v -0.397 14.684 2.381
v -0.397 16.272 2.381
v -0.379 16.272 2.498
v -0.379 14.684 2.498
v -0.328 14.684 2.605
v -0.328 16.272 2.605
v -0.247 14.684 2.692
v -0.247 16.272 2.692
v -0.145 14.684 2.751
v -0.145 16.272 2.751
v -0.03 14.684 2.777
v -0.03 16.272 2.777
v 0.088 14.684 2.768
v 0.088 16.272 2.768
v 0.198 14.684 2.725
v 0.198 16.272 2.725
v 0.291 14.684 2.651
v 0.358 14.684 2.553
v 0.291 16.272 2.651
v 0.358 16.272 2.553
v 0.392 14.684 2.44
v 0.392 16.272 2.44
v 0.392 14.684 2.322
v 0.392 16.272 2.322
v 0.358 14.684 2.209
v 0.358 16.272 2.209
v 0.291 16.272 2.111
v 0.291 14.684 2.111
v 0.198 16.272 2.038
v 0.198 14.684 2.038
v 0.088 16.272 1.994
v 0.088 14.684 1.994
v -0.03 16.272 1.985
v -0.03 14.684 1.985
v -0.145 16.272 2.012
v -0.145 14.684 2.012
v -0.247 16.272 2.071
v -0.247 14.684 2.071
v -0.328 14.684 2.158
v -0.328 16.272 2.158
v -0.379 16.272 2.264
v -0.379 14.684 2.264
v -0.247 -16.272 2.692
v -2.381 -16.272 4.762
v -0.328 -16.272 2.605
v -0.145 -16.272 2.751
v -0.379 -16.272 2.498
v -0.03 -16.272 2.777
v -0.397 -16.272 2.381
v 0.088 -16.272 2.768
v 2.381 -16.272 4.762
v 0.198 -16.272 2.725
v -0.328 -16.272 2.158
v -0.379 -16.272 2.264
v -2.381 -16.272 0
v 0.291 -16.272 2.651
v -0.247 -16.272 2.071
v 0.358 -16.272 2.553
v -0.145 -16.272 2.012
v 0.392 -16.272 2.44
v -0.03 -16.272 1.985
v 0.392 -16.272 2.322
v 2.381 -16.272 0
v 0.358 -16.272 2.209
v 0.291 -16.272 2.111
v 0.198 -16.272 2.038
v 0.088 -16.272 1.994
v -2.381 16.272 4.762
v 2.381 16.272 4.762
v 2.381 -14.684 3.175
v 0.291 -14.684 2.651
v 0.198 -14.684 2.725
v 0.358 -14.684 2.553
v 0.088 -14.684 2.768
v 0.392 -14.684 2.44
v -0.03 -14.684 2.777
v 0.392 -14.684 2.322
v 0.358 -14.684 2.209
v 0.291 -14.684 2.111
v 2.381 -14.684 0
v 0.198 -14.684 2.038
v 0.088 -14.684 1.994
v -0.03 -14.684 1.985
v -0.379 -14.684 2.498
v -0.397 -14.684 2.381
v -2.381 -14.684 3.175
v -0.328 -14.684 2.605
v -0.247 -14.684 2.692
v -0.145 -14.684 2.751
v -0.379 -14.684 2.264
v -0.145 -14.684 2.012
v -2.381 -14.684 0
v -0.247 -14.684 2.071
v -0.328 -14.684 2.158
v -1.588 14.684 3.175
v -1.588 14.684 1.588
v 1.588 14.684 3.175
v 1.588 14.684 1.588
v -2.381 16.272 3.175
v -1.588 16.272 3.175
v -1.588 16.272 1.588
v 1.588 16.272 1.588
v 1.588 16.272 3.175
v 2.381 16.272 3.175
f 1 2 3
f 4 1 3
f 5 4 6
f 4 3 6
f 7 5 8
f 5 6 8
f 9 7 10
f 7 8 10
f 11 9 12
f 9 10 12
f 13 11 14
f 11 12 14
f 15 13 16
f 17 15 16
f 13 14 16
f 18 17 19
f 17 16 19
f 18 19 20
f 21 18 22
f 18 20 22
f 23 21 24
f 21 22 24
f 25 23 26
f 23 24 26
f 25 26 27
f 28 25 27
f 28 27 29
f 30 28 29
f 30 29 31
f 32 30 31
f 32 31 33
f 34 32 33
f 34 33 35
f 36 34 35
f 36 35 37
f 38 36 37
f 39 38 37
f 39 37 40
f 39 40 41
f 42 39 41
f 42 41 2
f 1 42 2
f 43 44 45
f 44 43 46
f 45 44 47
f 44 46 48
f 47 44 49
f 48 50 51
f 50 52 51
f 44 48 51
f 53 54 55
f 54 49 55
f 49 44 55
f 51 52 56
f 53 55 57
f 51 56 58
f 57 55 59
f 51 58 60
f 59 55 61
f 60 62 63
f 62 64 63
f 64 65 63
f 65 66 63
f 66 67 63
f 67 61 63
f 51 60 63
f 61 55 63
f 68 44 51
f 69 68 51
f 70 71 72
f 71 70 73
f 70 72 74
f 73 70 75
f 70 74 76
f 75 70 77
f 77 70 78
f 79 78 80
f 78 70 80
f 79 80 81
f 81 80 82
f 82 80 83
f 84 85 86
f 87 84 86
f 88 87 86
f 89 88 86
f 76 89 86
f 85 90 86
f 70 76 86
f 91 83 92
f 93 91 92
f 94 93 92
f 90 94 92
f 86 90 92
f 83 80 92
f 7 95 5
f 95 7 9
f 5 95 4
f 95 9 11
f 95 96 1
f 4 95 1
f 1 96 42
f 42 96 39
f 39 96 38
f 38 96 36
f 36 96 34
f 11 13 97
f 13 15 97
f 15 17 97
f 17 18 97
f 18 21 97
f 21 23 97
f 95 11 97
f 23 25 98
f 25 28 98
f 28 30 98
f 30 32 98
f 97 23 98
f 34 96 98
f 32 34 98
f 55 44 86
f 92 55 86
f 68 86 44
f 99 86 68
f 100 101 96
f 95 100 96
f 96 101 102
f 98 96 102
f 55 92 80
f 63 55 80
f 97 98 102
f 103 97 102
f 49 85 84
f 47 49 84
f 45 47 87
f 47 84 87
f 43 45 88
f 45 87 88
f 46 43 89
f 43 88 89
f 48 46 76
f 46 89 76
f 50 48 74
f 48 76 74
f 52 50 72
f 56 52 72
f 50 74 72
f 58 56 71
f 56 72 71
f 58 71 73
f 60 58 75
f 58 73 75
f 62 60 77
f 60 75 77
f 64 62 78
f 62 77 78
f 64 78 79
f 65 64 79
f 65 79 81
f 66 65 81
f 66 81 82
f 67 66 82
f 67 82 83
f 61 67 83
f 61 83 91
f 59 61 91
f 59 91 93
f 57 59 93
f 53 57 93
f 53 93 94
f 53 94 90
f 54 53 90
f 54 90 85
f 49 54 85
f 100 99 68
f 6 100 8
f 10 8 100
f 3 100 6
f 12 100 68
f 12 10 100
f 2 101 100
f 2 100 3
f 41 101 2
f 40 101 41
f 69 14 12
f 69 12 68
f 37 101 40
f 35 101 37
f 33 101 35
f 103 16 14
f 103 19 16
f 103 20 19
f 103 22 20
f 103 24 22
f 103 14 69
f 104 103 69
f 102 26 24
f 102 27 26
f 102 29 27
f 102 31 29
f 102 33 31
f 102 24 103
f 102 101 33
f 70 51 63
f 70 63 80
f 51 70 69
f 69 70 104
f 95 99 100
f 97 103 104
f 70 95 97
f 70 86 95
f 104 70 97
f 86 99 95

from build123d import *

# Parameters (mm, degrees)
F0_W     = 4.7625
F0_H     = 32.54375
F1_DEPTH = 4.7625
F3_DEPTH = 3.175
F4_DEPTH = 1.5875
F5_R     = 0.396875
F6_DEPTH = 32.54475


with BuildPart() as f1:
    # F0 (on Top) → F1 (new body)
    with BuildSketch(Plane.XY):
        Rectangle(F0_W, F0_H)
    extrude(amount=F1_DEPTH)

    # F2 (on face) → F3 (cut)
    with BuildSketch(Plane(origin=(0, 0, 0), x_dir=(1, 0, 0), z_dir=(0, 0, -1))):
        Polygon((2.38125, -16.271875), (2.38125, 14.684375), (-2.38125, 14.684375), (-2.38125, -16.271875), (-1.5875, -16.271875), (-1.5875, -14.684375), (1.5875, -14.684375), (1.5875, -16.271875), align=None)
    extrude(amount=-F3_DEPTH, mode=Mode.SUBTRACT)

    # F4 (cut): a face of the model
    f4_faces = [f1.faces().sort_by_distance(p)[0] for p in [
        (0, 15.478125, 0),
    ]]
    extrude(f4_faces, amount=-F4_DEPTH, mode=Mode.SUBTRACT)

    # F5 (on face) → F6 (cut, through all)
    with BuildSketch(Plane(origin=(0, 16.271875, 0), x_dir=(-1, 0, 0), z_dir=(0, 1, 0))):
        with Locations((0, 2.38125)):
            Circle(F5_R)
    extrude(amount=-F6_DEPTH, mode=Mode.SUBTRACT)


solid = f1.part
